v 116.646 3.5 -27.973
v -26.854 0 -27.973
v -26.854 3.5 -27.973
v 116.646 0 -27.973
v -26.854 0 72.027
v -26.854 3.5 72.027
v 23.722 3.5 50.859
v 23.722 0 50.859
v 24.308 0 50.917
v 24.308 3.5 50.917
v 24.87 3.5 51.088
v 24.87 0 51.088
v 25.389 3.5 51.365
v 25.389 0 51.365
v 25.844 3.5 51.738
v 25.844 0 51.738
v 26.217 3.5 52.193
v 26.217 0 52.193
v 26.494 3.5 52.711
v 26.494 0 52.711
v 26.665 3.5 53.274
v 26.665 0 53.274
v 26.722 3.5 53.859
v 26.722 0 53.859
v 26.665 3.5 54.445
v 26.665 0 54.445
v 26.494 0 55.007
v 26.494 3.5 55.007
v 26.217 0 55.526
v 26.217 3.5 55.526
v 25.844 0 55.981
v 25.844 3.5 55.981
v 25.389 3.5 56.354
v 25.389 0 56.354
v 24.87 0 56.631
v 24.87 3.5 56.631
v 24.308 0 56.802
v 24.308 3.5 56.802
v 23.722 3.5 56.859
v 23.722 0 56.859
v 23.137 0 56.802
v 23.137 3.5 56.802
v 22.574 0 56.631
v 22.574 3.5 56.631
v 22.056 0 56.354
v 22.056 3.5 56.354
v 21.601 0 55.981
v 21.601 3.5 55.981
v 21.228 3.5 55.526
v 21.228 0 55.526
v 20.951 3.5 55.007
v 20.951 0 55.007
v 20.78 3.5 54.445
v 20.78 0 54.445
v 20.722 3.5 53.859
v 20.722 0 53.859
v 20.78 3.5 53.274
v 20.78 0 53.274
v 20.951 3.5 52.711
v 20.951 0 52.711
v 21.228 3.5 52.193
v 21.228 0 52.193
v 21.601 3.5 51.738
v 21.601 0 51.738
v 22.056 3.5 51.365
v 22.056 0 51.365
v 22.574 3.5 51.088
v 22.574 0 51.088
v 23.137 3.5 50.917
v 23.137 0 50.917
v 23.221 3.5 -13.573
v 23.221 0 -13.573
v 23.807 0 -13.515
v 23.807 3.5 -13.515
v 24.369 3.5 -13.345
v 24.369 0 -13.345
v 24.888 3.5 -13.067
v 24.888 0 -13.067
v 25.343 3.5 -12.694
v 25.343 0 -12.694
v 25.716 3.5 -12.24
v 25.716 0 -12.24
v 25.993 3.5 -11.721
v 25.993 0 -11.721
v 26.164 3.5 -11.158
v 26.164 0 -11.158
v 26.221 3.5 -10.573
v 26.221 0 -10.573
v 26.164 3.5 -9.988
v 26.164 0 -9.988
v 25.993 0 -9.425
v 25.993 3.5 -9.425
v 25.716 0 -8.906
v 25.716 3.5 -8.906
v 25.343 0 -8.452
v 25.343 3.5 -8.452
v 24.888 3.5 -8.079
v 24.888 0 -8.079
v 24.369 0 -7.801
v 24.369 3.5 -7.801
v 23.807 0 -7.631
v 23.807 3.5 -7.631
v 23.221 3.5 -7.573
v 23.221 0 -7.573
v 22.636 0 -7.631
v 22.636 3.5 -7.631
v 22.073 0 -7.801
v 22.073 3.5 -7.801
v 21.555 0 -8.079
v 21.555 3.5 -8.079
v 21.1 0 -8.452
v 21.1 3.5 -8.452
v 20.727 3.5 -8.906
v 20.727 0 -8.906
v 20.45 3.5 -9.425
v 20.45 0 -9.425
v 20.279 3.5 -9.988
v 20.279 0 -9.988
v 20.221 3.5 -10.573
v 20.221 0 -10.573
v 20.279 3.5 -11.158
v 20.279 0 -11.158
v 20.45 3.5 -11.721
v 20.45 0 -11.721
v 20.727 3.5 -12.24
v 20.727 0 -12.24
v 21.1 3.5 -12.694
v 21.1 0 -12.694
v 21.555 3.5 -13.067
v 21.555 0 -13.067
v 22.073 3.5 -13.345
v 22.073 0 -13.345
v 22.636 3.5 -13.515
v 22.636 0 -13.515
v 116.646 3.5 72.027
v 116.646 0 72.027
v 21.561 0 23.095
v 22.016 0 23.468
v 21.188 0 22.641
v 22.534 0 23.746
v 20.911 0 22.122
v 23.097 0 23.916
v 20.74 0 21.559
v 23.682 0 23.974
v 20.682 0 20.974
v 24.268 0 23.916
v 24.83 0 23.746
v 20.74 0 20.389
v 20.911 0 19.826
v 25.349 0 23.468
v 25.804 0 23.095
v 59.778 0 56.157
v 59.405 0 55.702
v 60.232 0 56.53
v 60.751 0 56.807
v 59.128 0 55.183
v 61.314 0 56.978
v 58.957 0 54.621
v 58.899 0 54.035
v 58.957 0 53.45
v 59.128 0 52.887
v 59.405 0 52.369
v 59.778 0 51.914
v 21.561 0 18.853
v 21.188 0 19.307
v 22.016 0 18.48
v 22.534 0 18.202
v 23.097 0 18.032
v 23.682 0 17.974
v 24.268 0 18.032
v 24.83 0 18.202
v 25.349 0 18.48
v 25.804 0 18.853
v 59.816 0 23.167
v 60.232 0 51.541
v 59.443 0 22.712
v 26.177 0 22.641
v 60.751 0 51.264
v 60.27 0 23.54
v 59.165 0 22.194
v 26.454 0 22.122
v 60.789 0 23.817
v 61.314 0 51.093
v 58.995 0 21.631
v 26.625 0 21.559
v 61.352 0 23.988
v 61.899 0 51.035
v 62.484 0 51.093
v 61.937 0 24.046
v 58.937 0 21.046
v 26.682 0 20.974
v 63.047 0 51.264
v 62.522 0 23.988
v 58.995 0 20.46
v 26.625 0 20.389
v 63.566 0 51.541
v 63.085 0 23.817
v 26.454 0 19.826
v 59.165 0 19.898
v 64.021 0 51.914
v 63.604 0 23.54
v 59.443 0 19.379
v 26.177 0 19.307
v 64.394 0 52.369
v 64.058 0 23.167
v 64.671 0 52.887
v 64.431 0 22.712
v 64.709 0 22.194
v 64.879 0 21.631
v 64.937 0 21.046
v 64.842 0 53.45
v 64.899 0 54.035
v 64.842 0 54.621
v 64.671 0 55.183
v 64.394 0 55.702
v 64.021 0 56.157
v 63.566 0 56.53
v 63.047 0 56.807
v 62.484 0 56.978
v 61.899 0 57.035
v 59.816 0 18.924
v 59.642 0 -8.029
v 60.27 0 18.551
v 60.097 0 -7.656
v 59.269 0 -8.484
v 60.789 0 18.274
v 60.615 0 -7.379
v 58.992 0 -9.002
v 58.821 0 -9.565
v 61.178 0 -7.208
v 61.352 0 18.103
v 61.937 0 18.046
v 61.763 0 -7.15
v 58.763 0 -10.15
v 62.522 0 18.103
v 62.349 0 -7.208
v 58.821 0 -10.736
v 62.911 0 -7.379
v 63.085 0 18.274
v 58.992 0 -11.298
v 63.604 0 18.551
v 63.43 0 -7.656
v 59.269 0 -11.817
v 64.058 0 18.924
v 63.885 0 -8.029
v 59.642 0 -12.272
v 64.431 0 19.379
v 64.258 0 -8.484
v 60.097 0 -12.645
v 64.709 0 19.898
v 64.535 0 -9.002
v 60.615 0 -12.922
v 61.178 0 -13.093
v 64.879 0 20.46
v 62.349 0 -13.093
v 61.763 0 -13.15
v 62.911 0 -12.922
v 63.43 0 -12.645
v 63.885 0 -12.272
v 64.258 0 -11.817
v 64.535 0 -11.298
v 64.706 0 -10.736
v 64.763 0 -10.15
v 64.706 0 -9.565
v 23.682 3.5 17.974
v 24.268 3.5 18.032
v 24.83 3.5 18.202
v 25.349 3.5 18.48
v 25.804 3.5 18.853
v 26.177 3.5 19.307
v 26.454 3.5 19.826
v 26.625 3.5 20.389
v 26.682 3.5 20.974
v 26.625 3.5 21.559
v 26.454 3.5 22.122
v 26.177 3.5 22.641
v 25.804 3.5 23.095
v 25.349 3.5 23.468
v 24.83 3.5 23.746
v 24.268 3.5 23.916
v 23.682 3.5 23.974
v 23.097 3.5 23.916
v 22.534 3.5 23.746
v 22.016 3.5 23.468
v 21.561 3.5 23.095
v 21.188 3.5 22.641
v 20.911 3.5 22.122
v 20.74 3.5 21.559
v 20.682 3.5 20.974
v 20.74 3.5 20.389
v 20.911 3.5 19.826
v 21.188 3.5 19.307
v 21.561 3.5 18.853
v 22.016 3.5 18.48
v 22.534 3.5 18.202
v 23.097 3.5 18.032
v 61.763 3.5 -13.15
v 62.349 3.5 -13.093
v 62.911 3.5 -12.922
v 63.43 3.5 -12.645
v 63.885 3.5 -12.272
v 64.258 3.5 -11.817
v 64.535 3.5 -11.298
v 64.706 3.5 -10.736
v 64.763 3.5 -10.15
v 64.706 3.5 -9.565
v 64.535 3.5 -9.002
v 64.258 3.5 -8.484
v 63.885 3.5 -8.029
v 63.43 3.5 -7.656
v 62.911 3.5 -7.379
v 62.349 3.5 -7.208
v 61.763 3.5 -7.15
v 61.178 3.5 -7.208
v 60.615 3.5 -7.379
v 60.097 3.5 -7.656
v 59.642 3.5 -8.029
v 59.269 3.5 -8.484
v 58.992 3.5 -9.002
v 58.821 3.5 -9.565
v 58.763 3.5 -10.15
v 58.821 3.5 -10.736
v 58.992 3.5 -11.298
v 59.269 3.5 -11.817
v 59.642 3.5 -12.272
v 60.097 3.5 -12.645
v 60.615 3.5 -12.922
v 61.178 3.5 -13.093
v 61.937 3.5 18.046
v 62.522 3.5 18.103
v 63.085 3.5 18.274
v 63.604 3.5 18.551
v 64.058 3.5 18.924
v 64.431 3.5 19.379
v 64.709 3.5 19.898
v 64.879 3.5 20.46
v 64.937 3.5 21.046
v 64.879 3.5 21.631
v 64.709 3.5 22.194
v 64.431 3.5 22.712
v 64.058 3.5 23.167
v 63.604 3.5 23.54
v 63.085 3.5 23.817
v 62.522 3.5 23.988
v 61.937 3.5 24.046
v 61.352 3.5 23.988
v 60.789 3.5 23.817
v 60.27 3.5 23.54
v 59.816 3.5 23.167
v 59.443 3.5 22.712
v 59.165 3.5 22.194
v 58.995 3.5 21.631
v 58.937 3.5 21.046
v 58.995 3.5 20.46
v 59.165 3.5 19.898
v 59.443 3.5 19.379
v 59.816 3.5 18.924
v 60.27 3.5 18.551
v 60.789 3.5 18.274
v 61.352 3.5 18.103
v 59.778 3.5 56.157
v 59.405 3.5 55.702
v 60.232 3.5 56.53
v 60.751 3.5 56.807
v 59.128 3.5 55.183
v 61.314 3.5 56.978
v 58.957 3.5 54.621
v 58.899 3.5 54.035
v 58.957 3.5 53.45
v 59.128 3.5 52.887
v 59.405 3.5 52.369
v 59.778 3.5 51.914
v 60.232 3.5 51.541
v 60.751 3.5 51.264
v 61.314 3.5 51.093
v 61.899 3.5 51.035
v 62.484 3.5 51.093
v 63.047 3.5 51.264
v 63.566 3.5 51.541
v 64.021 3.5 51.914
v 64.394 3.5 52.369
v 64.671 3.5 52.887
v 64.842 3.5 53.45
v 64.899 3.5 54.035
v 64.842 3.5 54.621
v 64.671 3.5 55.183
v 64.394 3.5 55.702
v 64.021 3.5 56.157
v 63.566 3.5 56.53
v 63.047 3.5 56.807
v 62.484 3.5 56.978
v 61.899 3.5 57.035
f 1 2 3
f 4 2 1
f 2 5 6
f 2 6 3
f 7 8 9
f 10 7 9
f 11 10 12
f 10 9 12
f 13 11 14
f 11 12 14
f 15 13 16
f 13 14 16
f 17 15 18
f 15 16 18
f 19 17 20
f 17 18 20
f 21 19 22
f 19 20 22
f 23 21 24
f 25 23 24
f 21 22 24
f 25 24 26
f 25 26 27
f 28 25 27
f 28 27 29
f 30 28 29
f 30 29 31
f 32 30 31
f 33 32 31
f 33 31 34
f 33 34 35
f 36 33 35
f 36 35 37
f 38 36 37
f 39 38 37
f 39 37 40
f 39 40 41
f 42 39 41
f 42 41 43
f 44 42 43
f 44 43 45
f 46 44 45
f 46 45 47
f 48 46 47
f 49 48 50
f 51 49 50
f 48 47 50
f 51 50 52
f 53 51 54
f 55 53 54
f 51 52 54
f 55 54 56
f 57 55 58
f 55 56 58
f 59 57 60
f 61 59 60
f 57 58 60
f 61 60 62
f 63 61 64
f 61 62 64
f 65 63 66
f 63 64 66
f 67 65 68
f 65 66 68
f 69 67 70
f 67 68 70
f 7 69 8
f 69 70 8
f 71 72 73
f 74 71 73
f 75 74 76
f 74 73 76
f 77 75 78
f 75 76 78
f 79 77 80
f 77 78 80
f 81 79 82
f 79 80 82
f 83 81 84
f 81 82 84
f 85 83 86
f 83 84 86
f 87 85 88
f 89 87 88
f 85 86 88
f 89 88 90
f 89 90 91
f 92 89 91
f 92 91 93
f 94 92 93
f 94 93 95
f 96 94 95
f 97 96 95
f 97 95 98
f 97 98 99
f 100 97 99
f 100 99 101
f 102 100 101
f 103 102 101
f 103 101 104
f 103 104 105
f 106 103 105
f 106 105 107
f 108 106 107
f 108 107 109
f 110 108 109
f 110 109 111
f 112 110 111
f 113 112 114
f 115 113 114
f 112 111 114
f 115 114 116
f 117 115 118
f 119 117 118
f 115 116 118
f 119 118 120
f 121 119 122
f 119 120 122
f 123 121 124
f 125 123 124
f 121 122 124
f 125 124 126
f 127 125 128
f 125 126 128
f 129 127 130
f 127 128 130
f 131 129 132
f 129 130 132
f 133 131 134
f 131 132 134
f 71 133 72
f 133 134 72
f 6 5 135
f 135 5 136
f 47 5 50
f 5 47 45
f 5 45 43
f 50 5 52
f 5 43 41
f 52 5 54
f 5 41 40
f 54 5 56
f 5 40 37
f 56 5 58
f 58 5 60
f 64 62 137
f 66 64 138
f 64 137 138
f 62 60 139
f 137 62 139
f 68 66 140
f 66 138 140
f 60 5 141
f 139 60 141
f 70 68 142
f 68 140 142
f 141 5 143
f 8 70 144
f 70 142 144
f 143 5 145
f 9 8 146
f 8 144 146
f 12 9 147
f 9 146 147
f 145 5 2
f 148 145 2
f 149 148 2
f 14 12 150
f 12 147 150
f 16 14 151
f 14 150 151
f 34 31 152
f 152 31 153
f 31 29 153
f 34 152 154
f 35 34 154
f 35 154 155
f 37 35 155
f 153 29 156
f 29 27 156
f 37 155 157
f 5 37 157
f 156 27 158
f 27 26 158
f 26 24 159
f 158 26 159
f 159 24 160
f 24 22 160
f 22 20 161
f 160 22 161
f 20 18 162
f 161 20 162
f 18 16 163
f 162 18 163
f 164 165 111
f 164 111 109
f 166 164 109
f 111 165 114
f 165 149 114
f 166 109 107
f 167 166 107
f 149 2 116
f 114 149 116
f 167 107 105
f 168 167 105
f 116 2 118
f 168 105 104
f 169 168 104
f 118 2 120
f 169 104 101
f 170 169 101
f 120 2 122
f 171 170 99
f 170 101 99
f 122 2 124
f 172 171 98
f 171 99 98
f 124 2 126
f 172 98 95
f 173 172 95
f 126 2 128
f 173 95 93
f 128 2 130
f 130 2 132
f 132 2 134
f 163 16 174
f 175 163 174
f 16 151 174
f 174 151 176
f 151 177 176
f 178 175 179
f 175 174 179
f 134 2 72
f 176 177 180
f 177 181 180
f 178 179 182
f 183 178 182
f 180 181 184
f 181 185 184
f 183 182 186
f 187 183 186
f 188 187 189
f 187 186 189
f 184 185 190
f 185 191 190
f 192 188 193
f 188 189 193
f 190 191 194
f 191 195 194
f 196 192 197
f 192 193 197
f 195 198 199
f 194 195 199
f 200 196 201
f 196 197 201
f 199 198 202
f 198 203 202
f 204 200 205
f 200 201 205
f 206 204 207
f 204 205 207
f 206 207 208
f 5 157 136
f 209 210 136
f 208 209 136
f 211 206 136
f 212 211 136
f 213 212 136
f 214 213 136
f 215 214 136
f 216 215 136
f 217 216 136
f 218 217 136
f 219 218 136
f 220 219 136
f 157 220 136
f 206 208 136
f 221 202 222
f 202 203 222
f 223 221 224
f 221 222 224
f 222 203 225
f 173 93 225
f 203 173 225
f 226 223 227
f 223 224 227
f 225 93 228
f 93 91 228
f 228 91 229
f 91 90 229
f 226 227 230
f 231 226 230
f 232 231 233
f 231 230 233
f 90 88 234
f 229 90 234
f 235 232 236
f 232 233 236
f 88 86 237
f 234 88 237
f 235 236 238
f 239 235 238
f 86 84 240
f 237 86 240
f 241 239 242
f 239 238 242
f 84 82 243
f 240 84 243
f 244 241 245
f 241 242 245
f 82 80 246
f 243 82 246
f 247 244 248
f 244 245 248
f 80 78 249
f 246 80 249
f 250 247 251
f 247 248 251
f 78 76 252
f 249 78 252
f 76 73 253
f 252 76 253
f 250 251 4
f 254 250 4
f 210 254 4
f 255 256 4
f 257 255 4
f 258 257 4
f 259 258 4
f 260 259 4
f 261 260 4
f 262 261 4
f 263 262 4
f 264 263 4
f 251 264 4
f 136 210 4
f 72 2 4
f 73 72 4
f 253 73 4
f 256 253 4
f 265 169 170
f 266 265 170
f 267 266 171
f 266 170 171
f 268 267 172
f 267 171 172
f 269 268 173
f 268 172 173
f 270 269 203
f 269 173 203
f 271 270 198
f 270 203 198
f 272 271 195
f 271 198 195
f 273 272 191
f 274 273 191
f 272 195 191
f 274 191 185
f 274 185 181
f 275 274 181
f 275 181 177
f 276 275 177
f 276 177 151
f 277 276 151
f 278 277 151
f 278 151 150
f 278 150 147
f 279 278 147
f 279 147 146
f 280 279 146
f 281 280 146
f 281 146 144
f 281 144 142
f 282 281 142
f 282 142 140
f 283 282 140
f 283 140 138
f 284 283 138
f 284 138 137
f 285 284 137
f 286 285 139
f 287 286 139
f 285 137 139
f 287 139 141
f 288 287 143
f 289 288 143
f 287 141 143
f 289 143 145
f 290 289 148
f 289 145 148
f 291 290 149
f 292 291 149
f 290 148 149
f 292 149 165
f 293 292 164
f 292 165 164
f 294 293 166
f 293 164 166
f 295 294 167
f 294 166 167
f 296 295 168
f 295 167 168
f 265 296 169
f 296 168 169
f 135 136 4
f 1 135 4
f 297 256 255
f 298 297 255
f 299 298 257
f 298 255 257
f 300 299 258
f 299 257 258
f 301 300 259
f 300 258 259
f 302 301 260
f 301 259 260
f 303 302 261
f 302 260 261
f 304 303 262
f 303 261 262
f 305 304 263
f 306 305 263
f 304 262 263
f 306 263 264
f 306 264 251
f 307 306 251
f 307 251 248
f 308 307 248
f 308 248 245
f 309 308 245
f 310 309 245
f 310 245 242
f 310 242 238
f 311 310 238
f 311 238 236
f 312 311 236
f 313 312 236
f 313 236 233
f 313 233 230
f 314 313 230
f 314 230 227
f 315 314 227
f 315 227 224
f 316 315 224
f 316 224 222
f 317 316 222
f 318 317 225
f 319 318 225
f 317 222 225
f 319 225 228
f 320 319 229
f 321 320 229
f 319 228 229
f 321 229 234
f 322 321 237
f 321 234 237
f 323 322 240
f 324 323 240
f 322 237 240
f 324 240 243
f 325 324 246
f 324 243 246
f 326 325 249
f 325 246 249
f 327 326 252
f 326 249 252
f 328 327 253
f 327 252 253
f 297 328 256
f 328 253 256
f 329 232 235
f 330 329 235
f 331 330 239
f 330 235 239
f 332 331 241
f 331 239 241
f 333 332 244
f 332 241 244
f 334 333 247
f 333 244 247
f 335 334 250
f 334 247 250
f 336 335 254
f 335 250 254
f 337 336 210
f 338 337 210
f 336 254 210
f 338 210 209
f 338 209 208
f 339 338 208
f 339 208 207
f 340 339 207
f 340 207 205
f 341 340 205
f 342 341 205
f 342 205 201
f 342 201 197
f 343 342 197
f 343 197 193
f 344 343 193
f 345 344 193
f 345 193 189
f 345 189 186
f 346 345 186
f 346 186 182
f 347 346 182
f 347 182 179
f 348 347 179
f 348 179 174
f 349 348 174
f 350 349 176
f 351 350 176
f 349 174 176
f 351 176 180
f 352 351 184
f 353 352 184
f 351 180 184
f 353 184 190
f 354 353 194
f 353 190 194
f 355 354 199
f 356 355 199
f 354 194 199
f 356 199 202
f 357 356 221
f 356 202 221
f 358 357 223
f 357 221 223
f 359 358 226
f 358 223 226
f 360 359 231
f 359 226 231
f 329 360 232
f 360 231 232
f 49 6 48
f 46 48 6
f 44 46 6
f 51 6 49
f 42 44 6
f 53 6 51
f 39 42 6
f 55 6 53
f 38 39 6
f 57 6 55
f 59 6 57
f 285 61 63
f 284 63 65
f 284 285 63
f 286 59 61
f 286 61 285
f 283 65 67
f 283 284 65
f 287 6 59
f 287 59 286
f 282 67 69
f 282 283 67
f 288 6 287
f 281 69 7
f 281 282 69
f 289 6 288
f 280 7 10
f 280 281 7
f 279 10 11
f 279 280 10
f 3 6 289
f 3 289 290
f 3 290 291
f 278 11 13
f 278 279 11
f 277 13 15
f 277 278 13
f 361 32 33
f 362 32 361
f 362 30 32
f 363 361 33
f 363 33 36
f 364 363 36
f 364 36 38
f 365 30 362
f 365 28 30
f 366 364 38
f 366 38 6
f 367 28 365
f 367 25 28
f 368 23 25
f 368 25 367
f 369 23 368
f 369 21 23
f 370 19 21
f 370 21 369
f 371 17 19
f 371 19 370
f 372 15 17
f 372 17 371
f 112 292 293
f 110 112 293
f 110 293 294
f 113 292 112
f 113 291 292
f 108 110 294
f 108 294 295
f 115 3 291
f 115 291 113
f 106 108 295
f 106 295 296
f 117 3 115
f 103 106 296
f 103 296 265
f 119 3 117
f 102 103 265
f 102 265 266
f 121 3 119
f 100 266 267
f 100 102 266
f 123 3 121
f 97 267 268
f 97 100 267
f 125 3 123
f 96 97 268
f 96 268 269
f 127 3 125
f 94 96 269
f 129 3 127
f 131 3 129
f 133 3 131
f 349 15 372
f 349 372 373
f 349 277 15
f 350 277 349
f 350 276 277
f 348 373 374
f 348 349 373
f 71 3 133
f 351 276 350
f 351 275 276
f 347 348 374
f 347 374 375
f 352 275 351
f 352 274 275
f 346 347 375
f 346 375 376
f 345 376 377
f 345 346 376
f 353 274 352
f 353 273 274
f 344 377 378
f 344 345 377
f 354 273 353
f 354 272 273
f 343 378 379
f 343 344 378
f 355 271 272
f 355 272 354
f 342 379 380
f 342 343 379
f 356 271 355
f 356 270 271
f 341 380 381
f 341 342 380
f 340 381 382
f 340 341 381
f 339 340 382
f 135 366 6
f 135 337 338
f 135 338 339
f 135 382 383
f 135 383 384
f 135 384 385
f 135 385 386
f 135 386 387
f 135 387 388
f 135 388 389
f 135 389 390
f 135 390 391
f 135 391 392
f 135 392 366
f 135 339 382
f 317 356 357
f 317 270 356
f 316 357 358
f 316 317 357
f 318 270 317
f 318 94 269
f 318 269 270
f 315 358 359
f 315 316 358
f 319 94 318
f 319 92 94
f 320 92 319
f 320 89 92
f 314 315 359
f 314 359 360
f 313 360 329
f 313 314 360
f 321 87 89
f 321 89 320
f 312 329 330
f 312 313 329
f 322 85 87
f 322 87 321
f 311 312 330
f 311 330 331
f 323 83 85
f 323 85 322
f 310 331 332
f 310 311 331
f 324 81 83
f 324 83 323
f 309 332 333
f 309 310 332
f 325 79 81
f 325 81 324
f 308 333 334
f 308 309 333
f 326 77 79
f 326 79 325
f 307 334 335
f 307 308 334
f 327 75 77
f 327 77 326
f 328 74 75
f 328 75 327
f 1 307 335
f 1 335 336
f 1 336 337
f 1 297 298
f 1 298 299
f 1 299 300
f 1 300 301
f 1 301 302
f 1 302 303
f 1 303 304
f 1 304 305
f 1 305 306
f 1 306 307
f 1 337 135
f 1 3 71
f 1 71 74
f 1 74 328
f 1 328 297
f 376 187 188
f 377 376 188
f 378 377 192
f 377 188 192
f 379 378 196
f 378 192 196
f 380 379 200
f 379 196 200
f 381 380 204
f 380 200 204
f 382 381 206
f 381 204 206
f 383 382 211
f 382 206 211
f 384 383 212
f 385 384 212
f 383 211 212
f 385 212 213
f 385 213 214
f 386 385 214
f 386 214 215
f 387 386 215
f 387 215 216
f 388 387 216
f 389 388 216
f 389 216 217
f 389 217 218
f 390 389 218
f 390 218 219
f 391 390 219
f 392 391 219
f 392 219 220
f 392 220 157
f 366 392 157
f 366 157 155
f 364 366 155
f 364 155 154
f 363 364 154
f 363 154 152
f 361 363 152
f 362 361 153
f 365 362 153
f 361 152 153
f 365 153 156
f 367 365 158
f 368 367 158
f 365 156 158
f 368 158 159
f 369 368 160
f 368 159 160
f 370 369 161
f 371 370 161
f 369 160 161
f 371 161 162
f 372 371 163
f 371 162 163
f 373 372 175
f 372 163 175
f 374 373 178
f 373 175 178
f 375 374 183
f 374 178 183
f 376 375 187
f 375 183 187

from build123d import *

# Parameters (mm, degrees)
SKETCH1_W             = 143.5
SKETCH1_H             = 100
BOSS_EXTRUDE1_DEPTH   = 3.5
F_6_0MM_DOWEL_HOLE1_D = 6
F_6_0MM_DOWEL_HOLE2_D = 6
F_6_0MM_DOWEL_HOLE3_D = 6
F_6_0MM_DOWEL_HOLE4_D = 6
F_6_0MM_DOWEL_HOLE5_D = 6
F_6_0MM_DOWEL_HOLE6_D = 6


with BuildPart() as part:
    # Sketch1 → Boss-Extrude1 (new body)
    with BuildSketch(Plane(origin=(0, 0, 0), x_dir=(1, 0, 0), z_dir=(0, 1, 0))):
        with Locations((44.896177875, -22.027268619)):
            Rectangle(SKETCH1_W, SKETCH1_H)
    extrude(amount=BOSS_EXTRUDE1_DEPTH)

    # Ø6.0mm Dowel Hole1 (through all)
    with Locations(Plane(origin=(237.217905301, 3.5, -102.05218535), x_dir=(0, 0, 1), z_dir=(0, 1, 0))):
        with Locations((156.087532559, -175.318700205)):
            Hole(F_6_0MM_DOWEL_HOLE1_D / 2)

    # Ø6.0mm Dowel Hole2 (through all)
    with Locations(Plane(origin=(237.217905301, 3.5, -102.05218535), x_dir=(0, 0, 1), z_dir=(0, 1, 0))):
        with Locations((123.097877986, -175.280990501)):
            Hole(F_6_0MM_DOWEL_HOLE2_D / 2)

    # Ø6.0mm Dowel Hole3 (through all)
    with Locations(Plane(origin=(237.217905301, 3.5, -102.05218535), x_dir=(0, 0, 1), z_dir=(0, 1, 0))):
        with Locations((123.026211567, -213.535463753)):
            Hole(F_6_0MM_DOWEL_HOLE3_D / 2)

    # Ø6.0mm Dowel Hole4 (through all)
    with Locations(Plane(origin=(237.217905301, 3.5, -102.05218535), x_dir=(0, 0, 1), z_dir=(0, 1, 0))):
        with Locations((155.91154644, -213.495641578)):
            Hole(F_6_0MM_DOWEL_HOLE4_D / 2)

    # Ø6.0mm Dowel Hole5 (through all)
    with Locations(Plane(origin=(237.217905301, 3.5, -102.05218535), x_dir=(0, 0, 1), z_dir=(0, 1, 0))):
        with Locations((91.479185985, -213.996610116)):
            Hole(F_6_0MM_DOWEL_HOLE5_D / 2)

    # Ø6.0mm Dowel Hole6 (through all)
    with Locations(Plane(origin=(237.217905301, 3.5, -102.05218535), x_dir=(0, 0, 1), z_dir=(0, 1, 0))):
        with Locations((91.901828901, -175.454462016)):
            Hole(F_6_0MM_DOWEL_HOLE6_D / 2)


solid = part.part
